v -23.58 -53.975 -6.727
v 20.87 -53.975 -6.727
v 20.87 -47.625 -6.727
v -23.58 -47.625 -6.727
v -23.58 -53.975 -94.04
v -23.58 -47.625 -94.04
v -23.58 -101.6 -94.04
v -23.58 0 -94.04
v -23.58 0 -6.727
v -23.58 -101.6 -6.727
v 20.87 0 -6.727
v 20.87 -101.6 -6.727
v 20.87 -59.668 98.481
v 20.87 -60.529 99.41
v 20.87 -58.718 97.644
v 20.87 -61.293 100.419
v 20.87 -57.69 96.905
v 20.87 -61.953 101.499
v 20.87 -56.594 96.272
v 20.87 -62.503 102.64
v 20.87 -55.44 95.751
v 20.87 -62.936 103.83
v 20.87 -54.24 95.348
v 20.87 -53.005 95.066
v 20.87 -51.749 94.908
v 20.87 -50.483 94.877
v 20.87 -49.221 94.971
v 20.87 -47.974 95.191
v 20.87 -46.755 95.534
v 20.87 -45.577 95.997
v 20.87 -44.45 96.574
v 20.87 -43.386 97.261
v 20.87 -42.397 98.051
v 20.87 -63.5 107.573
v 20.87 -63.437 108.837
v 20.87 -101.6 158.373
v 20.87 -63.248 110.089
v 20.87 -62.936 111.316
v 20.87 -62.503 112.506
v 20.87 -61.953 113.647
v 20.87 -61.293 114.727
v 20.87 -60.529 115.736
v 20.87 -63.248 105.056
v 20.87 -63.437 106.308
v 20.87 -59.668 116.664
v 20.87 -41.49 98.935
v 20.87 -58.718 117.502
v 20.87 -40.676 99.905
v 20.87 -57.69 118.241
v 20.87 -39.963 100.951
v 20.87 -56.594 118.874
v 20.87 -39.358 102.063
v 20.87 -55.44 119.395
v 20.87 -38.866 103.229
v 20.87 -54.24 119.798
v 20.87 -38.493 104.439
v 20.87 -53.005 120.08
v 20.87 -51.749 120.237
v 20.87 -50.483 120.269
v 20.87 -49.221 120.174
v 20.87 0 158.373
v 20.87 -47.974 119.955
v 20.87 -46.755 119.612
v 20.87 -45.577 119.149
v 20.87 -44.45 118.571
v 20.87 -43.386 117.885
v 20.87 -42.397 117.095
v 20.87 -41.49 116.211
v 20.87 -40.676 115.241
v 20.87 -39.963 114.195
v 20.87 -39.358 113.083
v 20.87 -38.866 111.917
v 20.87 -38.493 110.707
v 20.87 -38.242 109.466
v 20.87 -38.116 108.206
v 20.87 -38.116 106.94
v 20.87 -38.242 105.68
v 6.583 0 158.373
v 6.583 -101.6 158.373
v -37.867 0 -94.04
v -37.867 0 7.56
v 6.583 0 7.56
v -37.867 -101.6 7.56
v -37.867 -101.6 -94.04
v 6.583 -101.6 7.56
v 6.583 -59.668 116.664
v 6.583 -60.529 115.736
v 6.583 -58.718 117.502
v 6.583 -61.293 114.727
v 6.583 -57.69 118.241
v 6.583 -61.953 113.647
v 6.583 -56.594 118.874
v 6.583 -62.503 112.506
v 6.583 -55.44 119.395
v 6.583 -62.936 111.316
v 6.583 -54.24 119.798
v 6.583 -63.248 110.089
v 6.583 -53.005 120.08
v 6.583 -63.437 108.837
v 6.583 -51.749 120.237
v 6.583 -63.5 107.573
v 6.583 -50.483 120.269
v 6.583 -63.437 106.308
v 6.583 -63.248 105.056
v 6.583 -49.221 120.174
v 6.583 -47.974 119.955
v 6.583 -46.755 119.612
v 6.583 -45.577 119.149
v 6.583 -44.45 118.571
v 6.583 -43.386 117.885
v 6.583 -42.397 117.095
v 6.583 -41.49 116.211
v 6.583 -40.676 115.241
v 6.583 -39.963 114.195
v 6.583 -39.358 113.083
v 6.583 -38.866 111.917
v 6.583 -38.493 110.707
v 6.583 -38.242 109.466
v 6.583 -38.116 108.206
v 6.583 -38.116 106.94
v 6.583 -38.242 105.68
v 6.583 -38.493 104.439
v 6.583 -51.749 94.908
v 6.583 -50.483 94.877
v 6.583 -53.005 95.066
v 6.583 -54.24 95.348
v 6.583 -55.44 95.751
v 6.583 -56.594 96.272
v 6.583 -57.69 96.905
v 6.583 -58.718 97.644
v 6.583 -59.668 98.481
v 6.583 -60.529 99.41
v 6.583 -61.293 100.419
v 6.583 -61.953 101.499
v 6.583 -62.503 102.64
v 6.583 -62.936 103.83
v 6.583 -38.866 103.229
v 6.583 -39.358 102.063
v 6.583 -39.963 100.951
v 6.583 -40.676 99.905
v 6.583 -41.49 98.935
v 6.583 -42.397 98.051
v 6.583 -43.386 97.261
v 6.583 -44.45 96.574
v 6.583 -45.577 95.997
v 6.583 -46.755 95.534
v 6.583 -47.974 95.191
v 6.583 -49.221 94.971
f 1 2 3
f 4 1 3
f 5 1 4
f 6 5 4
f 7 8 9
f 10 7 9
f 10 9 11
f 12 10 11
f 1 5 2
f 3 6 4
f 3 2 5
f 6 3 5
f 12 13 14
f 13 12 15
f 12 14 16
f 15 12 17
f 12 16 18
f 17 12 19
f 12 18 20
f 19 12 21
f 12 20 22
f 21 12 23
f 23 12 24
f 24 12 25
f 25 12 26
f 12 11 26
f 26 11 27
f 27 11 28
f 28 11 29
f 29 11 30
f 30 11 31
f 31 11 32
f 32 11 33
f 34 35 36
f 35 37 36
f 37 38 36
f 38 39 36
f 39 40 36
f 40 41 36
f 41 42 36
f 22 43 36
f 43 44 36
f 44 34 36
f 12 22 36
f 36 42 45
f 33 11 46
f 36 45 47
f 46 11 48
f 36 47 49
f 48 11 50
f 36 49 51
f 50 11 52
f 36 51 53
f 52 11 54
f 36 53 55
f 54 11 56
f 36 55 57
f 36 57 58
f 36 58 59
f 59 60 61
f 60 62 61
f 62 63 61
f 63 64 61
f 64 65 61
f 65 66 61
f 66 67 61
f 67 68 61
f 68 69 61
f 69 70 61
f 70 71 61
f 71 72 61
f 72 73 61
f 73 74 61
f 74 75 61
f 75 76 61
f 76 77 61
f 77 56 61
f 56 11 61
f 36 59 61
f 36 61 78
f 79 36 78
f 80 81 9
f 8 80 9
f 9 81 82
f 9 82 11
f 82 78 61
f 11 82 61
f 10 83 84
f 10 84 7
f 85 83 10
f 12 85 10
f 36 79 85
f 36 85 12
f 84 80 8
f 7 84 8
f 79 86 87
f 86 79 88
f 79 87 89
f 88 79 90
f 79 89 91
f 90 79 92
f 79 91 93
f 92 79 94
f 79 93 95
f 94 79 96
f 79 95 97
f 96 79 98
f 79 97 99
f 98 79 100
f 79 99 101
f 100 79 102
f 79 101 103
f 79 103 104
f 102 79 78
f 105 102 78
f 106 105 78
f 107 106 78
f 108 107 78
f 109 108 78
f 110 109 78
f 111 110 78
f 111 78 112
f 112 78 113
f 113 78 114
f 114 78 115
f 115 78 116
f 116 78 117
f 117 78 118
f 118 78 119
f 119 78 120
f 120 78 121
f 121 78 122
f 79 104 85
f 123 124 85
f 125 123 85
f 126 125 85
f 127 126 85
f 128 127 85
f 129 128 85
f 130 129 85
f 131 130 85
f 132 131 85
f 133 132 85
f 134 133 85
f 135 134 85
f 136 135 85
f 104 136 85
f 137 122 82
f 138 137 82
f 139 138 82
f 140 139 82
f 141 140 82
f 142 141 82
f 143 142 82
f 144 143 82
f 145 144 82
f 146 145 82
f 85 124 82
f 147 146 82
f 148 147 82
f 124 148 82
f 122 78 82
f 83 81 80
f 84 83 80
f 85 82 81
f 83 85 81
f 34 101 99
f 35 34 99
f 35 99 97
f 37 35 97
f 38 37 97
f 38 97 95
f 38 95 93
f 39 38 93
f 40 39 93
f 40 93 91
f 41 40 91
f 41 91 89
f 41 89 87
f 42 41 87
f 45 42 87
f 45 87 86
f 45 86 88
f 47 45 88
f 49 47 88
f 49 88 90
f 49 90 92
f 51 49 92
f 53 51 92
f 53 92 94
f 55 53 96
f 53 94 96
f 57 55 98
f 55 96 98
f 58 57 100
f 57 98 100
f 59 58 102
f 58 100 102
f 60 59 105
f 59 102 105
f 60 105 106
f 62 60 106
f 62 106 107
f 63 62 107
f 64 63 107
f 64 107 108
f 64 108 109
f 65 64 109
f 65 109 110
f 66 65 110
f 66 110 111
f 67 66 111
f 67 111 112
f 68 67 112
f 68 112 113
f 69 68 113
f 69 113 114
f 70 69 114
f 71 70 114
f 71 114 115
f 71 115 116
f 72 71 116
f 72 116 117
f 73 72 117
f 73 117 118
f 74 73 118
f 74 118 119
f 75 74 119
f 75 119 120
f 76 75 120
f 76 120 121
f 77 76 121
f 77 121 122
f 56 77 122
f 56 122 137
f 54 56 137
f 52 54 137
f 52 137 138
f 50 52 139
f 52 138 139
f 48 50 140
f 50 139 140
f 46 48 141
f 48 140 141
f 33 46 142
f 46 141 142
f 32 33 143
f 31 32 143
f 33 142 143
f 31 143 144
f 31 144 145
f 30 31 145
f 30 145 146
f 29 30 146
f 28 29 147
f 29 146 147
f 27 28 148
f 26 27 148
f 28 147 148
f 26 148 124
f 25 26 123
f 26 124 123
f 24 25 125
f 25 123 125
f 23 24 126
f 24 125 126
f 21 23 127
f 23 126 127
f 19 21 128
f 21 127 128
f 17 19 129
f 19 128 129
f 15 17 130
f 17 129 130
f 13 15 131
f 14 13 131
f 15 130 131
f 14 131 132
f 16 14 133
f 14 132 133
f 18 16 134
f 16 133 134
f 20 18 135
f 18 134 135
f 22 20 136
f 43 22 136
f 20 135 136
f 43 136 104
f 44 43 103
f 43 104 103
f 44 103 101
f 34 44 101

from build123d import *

# Parameters (mm, degrees)
F1_DEPTH  = 101.6
F3_D      = 25.4
F4_W      = 101.6
F4_H      = 87.3125
F5_DEPTH  = 44.45
F7_DEPTH  = 101.601
F8_W      = 47.625
F8_H      = 97.9758906887
F9_DEPTH  = 127.2487635172
F10_DEPTH = 127.2487635172


with BuildPart() as f1:
    # F0 (on Front) → F1 (new body)
    with BuildSketch(Plane.XZ):
        Polygon((-37.8673051461, 7.5604184782), (-37.8673051461, -94.0395815218), (-23.5798051461, -94.0395815218), (-23.5798051461, -6.7270815218), (20.8701948539, -6.7270815218), (20.8701948539, 158.3729184782), (6.5826948539, 158.3729184782), (6.5826948539, 7.5604184782), align=None)
    extrude(amount=F1_DEPTH)

    # F3 (through all)
    with Locations(Plane.YZ.offset(20.8701948539)):
        with Locations((-50.8, 107.5729184782)):
            Hole(F3_D / 2)


with BuildPart() as f5:
    # F4 (on face) → F5 (new body, through all)
    with BuildSketch(Plane.YZ.offset(-23.5798051461)):
        with Locations((-50.8, -50.3833315218)):
            Rectangle(F4_W, F4_H)
    extrude(amount=F5_DEPTH)

    # F6 (on face) → F7 (cut, through all)
    with BuildSketch(Plane.XZ.offset(101.6)):
        Polygon((20.8701948539, -6.7270815218), (-23.5798051461, -94.0395815218), (20.8701948539, -94.0395815218), align=None)
    extrude(amount=-F7_DEPTH, mode=Mode.SUBTRACT)

    # F8 (on face) → F9 (cut, through all)
    with BuildSketch(Plane(origin=(19.2943147747, 0, -9.8225602489), x_dir=(0, 1, 0), z_dir=(0.8911631156, 0, -0.4536830407))):
        with Locations((-23.8125, -45.5144188116)):
            Rectangle(F8_W, F8_H)
    extrude(amount=-F9_DEPTH, mode=Mode.SUBTRACT)

    # F8 (on face) → F10 (cut, through all)
    with BuildSketch(Plane(origin=(19.2943147747, 0, -9.8225602489), x_dir=(0, 1, 0), z_dir=(0.8911631156, 0, -0.4536830407))):
        with Locations((-77.7875, -45.5144188116)):
            Rectangle(F8_W, F8_H)
    extrude(amount=-F10_DEPTH, mode=Mode.SUBTRACT)


solid = Compound([f1.part, f5.part])
